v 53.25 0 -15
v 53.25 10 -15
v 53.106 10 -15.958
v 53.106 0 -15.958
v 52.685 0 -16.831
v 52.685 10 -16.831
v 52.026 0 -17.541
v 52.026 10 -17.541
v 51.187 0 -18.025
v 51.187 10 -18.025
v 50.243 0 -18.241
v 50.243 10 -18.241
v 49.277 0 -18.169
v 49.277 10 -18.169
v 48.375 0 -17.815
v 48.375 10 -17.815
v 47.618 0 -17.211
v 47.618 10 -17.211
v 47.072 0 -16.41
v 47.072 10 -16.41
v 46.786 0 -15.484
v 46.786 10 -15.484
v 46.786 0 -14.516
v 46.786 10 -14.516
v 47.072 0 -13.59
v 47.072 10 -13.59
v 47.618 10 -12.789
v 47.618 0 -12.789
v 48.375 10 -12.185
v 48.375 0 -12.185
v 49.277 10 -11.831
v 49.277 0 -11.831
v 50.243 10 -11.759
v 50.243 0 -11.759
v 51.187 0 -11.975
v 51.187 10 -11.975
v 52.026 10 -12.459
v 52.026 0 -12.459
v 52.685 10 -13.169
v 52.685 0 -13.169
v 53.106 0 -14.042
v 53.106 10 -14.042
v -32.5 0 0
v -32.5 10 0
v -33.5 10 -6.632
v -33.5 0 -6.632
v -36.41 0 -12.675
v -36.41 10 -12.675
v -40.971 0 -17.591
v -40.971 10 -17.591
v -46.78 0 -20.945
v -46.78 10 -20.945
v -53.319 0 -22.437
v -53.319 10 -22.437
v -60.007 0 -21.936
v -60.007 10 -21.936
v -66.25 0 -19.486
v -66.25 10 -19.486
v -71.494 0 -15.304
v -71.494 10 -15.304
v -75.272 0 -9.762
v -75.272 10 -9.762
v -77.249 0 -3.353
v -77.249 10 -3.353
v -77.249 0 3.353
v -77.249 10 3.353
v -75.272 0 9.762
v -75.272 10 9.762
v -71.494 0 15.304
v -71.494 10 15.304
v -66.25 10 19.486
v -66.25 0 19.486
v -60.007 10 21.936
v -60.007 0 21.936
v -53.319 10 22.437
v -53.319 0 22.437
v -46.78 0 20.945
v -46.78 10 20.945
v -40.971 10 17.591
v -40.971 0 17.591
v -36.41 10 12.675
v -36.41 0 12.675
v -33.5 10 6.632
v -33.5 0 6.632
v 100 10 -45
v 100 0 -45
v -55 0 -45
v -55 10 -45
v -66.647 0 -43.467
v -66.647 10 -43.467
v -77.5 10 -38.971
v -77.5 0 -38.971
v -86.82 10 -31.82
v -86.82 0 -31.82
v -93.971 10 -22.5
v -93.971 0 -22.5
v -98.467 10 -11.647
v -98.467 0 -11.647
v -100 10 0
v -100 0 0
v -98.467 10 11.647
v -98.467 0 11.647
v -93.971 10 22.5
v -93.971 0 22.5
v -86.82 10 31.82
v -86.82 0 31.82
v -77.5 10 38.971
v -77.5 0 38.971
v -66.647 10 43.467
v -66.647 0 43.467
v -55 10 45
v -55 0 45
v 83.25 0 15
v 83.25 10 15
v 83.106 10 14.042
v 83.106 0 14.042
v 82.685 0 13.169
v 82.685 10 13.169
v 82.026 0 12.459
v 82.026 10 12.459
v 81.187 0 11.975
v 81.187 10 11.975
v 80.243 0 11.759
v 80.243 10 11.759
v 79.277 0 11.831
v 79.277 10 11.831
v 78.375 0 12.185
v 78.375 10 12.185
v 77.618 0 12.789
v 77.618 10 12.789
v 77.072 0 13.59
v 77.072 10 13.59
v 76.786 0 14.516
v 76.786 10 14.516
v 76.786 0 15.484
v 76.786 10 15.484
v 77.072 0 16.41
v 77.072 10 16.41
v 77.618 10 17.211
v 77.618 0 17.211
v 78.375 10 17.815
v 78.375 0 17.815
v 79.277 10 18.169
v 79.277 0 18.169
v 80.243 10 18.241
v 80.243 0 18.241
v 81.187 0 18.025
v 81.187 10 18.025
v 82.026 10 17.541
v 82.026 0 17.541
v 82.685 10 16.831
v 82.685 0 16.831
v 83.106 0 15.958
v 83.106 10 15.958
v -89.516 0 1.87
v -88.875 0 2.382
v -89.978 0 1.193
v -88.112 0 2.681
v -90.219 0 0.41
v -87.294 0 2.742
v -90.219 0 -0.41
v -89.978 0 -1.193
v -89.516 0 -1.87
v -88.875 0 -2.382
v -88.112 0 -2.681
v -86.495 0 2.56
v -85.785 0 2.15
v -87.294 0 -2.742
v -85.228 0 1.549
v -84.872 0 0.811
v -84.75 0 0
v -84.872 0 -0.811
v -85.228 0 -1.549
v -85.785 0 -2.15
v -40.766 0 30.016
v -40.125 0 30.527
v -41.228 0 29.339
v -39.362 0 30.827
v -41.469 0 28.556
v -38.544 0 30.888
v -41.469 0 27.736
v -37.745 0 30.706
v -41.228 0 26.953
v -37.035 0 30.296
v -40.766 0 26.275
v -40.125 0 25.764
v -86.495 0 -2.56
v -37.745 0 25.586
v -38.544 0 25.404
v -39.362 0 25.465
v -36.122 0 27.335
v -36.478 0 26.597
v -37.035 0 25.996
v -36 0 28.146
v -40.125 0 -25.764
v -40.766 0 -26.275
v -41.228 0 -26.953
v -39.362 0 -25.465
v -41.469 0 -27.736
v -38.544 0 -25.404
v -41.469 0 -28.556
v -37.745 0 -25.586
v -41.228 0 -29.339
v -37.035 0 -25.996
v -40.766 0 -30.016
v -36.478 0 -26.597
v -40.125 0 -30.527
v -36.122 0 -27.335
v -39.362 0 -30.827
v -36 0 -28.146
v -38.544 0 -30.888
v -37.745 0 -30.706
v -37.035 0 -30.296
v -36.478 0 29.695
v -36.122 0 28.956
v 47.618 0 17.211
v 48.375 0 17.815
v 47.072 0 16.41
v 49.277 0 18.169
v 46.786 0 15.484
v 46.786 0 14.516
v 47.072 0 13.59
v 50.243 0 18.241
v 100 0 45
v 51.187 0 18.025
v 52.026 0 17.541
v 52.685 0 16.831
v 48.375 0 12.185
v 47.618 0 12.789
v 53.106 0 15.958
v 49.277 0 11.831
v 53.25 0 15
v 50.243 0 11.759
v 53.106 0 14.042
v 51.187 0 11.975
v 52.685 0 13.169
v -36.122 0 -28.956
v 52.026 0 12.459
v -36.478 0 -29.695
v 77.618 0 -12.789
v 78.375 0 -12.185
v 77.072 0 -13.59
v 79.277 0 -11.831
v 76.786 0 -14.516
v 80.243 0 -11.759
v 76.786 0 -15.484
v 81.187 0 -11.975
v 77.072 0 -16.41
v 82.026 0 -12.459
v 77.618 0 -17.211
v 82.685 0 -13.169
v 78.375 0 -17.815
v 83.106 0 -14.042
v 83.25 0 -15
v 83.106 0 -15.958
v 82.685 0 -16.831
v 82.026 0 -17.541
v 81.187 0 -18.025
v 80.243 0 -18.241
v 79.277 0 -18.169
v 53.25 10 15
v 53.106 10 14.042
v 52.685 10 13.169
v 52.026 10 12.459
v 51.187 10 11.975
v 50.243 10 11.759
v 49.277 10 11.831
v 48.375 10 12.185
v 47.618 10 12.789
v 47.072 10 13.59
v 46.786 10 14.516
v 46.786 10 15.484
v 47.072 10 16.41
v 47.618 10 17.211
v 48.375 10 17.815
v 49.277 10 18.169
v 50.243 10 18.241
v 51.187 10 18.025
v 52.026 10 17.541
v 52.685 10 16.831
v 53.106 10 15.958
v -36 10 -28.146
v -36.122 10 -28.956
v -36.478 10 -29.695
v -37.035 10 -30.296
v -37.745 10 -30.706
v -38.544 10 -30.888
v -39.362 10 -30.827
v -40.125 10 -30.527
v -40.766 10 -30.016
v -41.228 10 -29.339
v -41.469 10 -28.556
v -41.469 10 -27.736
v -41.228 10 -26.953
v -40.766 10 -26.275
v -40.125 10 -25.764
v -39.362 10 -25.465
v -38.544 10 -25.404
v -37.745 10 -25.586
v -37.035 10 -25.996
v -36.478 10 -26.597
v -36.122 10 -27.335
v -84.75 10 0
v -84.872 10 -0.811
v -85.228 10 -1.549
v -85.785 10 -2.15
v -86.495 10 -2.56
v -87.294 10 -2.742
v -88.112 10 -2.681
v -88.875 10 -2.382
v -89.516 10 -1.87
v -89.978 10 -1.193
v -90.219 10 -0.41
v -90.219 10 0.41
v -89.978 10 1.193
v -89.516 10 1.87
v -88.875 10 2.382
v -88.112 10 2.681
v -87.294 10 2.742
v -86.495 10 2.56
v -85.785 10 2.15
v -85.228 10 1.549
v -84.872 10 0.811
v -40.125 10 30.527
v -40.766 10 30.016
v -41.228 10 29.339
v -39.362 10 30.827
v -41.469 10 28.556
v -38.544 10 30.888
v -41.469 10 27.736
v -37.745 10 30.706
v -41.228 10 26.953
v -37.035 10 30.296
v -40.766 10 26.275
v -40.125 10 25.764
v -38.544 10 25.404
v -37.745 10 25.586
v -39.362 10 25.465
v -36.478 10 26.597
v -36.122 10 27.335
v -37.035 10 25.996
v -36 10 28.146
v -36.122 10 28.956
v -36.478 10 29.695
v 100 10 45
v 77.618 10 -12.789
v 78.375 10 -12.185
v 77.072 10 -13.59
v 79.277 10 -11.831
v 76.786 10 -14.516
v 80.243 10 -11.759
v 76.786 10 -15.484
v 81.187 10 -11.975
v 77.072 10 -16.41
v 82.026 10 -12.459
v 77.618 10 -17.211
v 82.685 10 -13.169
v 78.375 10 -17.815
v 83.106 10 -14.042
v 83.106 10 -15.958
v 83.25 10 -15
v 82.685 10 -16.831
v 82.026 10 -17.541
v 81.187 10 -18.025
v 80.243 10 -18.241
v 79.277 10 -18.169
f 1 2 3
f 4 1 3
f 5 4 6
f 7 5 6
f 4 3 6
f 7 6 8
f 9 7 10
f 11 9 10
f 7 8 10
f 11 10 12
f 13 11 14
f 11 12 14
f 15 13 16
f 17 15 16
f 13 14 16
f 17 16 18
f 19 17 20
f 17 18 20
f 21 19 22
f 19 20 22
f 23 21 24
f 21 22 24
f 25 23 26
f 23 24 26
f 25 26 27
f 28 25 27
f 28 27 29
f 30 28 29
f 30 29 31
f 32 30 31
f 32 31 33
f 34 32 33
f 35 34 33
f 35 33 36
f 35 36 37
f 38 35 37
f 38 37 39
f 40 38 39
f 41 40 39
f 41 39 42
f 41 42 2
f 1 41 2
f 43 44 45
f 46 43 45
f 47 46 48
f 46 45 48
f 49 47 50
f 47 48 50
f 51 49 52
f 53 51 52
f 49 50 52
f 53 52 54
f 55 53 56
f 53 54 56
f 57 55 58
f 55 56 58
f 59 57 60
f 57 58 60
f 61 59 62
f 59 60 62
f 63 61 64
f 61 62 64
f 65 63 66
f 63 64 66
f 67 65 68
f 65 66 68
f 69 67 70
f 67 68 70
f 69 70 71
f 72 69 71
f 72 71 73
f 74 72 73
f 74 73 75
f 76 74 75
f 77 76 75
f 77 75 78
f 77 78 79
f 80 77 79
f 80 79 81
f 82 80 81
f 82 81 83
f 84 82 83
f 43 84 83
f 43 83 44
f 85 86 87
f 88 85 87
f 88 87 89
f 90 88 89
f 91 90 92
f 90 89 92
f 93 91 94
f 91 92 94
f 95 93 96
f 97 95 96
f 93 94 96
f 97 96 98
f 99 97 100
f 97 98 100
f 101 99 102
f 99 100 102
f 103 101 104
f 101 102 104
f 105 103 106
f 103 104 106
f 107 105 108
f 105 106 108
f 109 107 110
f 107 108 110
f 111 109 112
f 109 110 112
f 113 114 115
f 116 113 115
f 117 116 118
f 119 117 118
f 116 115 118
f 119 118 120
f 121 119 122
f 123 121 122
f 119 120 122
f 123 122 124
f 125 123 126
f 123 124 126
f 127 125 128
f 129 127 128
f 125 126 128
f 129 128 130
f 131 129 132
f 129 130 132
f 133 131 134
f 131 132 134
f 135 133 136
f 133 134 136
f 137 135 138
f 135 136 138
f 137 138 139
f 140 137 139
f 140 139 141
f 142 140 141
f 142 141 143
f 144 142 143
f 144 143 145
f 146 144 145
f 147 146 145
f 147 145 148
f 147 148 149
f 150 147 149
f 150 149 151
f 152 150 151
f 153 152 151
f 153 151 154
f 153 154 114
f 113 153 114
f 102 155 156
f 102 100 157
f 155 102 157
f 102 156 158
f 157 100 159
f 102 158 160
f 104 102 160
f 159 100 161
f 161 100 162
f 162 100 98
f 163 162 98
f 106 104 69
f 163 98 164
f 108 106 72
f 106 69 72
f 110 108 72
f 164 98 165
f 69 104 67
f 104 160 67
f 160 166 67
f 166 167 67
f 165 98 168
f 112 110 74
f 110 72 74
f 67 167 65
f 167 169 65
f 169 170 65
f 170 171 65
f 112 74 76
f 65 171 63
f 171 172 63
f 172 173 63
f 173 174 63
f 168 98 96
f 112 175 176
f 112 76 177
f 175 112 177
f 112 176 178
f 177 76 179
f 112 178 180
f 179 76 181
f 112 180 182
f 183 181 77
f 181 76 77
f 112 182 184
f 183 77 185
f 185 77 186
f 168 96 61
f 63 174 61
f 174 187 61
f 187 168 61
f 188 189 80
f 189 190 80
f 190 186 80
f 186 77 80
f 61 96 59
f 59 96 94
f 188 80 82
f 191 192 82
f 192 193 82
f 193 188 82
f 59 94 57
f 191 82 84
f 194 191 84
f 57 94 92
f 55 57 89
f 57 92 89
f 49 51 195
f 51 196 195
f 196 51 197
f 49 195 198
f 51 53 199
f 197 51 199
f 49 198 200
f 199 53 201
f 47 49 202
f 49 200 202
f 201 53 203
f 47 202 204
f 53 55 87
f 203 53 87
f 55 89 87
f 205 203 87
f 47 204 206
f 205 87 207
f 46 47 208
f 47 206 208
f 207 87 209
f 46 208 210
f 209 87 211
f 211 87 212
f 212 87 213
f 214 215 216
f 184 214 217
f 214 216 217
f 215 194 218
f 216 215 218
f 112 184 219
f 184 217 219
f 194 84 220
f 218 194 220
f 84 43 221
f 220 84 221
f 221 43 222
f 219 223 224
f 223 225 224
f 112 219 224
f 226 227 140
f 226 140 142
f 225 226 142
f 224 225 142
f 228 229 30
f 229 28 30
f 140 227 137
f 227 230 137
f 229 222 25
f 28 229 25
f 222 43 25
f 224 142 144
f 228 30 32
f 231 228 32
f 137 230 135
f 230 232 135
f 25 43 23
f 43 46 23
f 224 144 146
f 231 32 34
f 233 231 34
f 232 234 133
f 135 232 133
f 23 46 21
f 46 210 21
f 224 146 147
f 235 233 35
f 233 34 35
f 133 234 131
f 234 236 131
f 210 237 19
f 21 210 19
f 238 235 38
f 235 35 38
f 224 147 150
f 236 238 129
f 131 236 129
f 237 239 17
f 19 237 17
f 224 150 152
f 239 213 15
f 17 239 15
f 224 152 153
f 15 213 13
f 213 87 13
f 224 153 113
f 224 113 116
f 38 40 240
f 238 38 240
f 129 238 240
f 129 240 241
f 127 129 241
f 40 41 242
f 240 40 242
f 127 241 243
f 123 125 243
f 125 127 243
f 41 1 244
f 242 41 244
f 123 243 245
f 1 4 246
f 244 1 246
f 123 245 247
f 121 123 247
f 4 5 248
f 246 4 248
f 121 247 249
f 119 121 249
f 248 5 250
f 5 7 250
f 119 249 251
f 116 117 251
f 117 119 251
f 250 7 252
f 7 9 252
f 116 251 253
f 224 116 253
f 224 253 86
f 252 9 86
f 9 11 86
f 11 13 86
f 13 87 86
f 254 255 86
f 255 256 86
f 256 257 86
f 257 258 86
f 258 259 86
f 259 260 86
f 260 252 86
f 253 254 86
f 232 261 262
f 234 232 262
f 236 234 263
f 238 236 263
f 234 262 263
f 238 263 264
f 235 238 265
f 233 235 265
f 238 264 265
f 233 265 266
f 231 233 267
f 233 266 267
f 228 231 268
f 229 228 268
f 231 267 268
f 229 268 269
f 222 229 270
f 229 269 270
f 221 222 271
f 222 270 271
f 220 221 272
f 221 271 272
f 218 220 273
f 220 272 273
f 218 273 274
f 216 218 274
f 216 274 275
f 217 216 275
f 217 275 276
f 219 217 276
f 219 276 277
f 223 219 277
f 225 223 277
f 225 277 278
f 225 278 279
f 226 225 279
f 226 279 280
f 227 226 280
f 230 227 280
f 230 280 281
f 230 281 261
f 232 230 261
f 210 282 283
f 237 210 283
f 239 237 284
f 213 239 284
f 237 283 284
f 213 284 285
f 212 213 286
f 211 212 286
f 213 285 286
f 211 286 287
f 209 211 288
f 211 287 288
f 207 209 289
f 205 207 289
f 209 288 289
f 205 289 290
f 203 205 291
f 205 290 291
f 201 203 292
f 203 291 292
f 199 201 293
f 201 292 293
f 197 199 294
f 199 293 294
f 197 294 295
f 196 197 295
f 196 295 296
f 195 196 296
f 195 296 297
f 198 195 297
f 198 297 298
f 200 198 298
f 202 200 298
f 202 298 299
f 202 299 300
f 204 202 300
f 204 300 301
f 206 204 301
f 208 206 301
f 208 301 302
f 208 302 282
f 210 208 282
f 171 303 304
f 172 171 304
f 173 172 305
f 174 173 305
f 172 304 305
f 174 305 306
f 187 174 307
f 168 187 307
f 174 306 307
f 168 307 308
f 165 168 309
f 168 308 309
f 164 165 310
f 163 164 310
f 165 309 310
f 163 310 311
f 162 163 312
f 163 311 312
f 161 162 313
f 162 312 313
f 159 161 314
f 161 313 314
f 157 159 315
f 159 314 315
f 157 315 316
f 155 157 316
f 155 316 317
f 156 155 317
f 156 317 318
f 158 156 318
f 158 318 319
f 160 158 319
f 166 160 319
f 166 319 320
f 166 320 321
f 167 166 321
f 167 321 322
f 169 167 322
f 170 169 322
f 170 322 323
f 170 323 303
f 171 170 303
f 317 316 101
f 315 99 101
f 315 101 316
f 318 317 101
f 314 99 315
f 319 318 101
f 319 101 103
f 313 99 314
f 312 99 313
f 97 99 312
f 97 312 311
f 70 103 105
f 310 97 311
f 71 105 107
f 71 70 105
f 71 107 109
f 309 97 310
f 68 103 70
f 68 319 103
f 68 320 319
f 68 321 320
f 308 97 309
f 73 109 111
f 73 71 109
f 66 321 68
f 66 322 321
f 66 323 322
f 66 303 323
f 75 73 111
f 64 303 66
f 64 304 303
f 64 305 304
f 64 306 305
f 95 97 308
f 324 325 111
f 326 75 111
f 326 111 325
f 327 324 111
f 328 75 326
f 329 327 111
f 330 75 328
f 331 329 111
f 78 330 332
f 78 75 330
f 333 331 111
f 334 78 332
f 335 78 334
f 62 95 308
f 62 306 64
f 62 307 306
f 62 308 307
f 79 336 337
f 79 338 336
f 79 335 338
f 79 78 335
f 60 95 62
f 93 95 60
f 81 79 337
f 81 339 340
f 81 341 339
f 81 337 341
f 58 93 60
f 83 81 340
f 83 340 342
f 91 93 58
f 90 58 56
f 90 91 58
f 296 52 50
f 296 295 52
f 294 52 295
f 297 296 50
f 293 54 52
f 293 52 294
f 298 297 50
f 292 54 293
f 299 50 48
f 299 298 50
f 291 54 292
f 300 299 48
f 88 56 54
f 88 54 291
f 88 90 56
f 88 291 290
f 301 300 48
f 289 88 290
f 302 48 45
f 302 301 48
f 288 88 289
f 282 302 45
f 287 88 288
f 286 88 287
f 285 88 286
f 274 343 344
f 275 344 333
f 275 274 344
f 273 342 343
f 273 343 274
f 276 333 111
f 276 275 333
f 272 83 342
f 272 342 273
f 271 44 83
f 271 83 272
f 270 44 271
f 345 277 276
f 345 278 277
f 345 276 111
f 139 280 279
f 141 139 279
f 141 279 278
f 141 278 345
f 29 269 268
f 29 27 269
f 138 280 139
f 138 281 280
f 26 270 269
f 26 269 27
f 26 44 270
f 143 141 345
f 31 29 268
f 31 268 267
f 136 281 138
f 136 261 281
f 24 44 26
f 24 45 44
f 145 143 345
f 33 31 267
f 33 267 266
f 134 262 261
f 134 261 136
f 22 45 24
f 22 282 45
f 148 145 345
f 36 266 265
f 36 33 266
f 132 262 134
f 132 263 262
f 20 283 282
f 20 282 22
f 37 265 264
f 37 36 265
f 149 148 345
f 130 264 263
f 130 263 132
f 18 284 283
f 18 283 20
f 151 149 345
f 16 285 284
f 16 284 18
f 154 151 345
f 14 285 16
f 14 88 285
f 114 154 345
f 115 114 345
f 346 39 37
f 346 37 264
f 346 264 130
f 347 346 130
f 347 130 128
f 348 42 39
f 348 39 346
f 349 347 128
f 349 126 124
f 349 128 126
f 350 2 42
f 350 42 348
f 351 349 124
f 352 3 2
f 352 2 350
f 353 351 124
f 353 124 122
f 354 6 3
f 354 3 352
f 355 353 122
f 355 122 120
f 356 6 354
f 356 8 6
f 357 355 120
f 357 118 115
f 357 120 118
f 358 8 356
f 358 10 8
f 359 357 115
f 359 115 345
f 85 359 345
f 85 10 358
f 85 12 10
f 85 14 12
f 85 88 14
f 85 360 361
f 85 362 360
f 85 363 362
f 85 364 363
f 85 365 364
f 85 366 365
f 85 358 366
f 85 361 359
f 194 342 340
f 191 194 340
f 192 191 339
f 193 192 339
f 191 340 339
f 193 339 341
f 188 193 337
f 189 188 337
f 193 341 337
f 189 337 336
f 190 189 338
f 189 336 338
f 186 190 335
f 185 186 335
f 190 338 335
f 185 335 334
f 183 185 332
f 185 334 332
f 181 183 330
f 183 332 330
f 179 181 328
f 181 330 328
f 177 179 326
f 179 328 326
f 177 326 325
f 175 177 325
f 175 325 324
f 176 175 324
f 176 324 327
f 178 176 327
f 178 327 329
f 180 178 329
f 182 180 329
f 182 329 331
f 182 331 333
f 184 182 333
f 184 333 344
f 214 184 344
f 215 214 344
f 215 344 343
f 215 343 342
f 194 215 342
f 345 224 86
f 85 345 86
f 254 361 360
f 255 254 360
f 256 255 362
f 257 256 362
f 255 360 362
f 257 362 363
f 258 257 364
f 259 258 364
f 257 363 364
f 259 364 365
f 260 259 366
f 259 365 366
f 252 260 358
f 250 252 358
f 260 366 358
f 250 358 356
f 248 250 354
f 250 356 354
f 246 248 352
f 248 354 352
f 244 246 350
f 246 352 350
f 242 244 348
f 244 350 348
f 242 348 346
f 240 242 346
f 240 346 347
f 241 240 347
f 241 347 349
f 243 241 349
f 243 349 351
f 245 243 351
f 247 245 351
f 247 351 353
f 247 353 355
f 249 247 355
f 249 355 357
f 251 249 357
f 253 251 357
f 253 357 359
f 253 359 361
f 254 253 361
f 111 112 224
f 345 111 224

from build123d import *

# Parameters (mm, degrees)
BOSS_EXTRUDE1_DEPTH = 10
SKETCH2_R           = 2.75
SKETCH2_R_2         = 22.5
CUT_EXTRUDE1_DEPTH  = 11
SKETCH3_R           = 3.25
CUT_EXTRUDE2_DEPTH  = 11


with BuildPart() as part:
    # Sketch1 → Boss-Extrude1 (new body)
    with BuildSketch(Plane(origin=(0, 0, 0), x_dir=(1, 0, 0), z_dir=(0, 1, 0))):
        with BuildLine():
            Line((100, 45), (-55, 45))
            ThreePointArc((-55, 45), (-100, 0), (-55, -45))
            Line((-55, -45), (100, -45))
            Line((100, -45), (100, 45))
        make_face()
    extrude(amount=BOSS_EXTRUDE1_DEPTH)

    # Sketch2 → Cut-Extrude1 (cut, through all)
    with BuildSketch(Plane(origin=(0, 10, 0), x_dir=(1, 0, 0), z_dir=(0, 1, 0))):
        with Locations((-87.5, 0)):
            Circle(SKETCH2_R)
        with Locations((-38.75, 28.145825623)):
            Circle(SKETCH2_R)
        with Locations((-38.75, -28.145825623)):
            Circle(SKETCH2_R)
        with Locations((-55, 0)):
            Circle(SKETCH2_R_2)
    extrude(amount=-CUT_EXTRUDE1_DEPTH, mode=Mode.SUBTRACT)

    # Sketch3 → Cut-Extrude2 (cut, through all)
    with BuildSketch(Plane(origin=(0, 10, 0), x_dir=(1, 0, 0), z_dir=(0, 1, 0))):
        with Locations((80, 15)):
            Circle(SKETCH3_R)
        with Locations((50, 15)):
            Circle(SKETCH3_R)
        with Locations((50, -15)):
            Circle(SKETCH3_R)
        with Locations((80, -15)):
            Circle(SKETCH3_R)
    extrude(amount=-CUT_EXTRUDE2_DEPTH, mode=Mode.SUBTRACT)


solid = part.part
